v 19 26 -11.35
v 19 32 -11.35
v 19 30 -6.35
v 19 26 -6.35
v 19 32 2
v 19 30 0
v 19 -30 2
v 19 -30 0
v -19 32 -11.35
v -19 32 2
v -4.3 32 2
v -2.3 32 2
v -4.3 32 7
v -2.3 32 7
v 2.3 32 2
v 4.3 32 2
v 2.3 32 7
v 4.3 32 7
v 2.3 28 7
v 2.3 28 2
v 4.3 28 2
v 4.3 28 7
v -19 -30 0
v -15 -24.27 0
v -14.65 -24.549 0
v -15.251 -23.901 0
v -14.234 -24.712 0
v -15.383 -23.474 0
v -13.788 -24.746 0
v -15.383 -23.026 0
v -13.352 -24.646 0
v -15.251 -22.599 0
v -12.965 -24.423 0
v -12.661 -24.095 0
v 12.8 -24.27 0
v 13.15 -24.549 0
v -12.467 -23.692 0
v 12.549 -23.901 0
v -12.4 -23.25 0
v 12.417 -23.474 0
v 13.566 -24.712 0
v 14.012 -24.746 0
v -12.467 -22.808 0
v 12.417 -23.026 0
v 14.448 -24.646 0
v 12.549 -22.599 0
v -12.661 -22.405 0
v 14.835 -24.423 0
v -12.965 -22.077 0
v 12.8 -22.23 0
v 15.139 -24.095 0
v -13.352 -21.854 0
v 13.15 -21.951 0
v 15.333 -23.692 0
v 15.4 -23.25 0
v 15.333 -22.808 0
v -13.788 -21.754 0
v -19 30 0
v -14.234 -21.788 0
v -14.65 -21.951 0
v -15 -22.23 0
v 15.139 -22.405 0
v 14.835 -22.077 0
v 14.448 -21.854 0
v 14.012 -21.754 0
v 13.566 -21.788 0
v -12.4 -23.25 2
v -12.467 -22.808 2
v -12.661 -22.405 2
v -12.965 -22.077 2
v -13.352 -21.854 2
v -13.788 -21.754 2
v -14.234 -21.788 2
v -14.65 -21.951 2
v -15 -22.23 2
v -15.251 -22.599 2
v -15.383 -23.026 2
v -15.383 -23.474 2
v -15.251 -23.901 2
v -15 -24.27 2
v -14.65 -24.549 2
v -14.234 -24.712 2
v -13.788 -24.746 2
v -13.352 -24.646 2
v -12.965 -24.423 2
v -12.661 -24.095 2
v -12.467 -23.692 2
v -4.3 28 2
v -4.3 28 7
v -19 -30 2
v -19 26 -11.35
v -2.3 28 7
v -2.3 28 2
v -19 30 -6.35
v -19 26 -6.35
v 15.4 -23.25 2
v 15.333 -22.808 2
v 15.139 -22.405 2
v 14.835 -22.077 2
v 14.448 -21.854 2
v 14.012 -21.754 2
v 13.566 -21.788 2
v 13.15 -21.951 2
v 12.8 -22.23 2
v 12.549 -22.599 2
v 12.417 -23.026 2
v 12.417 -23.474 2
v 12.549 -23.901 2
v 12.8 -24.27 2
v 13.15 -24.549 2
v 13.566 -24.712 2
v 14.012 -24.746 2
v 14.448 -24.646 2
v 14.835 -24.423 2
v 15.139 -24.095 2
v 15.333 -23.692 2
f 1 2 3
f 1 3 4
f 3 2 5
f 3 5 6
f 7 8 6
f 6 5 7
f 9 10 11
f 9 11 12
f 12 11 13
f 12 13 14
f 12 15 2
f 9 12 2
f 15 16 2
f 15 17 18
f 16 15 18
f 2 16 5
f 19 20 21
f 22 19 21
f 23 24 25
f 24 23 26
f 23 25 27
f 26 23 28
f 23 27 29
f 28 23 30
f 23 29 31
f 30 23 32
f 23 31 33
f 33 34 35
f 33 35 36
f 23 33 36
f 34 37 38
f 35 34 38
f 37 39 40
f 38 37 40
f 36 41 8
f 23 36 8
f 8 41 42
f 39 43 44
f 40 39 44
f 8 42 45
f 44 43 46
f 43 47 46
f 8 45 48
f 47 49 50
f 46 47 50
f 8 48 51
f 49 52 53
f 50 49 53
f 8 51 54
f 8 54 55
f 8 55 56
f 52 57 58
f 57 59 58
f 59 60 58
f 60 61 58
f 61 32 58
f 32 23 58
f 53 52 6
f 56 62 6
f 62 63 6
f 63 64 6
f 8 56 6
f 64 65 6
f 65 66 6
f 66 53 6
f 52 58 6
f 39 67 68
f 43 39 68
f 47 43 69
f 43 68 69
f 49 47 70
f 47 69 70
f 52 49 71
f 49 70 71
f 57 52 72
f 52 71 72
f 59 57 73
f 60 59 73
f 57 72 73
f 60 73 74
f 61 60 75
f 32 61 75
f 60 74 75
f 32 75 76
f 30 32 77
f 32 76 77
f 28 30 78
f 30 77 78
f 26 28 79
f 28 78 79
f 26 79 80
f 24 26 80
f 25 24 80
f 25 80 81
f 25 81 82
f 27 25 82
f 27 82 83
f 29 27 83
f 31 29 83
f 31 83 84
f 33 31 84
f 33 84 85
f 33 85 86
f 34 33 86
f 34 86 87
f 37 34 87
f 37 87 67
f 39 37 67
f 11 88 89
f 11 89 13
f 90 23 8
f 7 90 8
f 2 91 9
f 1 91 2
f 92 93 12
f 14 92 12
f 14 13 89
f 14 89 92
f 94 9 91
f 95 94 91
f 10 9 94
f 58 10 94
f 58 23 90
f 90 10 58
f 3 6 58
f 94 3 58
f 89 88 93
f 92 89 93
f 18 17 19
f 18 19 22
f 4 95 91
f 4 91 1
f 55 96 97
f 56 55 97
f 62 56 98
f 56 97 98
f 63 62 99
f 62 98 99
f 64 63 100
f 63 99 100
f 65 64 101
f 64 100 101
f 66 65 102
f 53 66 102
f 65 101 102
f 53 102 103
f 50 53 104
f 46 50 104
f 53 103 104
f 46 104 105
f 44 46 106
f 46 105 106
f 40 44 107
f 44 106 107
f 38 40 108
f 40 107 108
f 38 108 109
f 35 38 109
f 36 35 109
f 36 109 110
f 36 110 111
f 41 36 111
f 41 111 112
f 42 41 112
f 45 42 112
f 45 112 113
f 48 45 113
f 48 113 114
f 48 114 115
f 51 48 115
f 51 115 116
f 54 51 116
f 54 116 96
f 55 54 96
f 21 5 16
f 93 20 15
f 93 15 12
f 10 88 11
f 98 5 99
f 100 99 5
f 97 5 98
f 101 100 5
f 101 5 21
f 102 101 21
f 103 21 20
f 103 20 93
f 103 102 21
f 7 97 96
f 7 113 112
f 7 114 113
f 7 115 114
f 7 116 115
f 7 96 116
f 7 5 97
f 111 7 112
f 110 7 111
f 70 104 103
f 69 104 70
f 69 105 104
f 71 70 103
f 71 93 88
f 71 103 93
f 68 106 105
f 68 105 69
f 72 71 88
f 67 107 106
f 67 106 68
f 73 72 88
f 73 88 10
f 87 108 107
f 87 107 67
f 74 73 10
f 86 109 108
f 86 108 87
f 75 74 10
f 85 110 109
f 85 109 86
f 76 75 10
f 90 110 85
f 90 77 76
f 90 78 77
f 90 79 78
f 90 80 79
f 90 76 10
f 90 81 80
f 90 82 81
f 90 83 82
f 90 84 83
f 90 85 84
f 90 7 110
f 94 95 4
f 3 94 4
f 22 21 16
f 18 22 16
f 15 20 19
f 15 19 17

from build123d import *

# Parameters (mm, degrees)
F0_W     = 38
F0_H     = 60
F1_DEPTH = 2
F2_W     = 38
F2_H     = 2
F2_H_2   = 6.35
F3_DEPTH = 2
F4_W     = 38
F4_H     = 6
F5_DEPTH = 5
F6_W     = 2
F6_H     = 4
F7_DEPTH = 5
F8_R     = 1.5
F9_DEPTH = 25


with BuildPart() as f1:
    # F0 (on Top) → F1 (new body)
    with BuildSketch(Plane.XY):
        Rectangle(F0_W, F0_H)
    extrude(amount=F1_DEPTH)

    # F2 (on face) → F3 (join)
    with BuildSketch(Plane(origin=(0, 30, 0), x_dir=(-1, 0, 0), z_dir=(0, 1, 0))):
        with Locations((0, 1)):
            Rectangle(F2_W, F2_H)
        with Locations((0, -3.175)):
            Rectangle(F2_W, F2_H_2)
    extrude(amount=F3_DEPTH)

    # F4 (on face) → F5 (join)
    with BuildSketch(Plane(origin=(0, 0, -6.35), x_dir=(1, 0, 0), z_dir=(0, 0, -1))):
        with Locations((0, -29)):
            Rectangle(F4_W, F4_H)
    extrude(amount=F5_DEPTH)

    # F6 (on face) → F7 (join)
    with BuildSketch(Plane.XY.offset(2)):
        with Locations((-3.3, 30)):
            Rectangle(F6_W, F6_H)
        with Locations((3.3, 30)):
            Rectangle(F6_W, F6_H)
    extrude(amount=F7_DEPTH)

    # F8 (on face) → F9 (cut)
    with BuildSketch(Plane.XY.offset(2)):
        with Locations((-13.9, -23.25)):
            Circle(F8_R)
        with Locations((13.9, -23.25)):
            Circle(F8_R)
    extrude(amount=-F9_DEPTH, mode=Mode.SUBTRACT)


solid = f1.part
